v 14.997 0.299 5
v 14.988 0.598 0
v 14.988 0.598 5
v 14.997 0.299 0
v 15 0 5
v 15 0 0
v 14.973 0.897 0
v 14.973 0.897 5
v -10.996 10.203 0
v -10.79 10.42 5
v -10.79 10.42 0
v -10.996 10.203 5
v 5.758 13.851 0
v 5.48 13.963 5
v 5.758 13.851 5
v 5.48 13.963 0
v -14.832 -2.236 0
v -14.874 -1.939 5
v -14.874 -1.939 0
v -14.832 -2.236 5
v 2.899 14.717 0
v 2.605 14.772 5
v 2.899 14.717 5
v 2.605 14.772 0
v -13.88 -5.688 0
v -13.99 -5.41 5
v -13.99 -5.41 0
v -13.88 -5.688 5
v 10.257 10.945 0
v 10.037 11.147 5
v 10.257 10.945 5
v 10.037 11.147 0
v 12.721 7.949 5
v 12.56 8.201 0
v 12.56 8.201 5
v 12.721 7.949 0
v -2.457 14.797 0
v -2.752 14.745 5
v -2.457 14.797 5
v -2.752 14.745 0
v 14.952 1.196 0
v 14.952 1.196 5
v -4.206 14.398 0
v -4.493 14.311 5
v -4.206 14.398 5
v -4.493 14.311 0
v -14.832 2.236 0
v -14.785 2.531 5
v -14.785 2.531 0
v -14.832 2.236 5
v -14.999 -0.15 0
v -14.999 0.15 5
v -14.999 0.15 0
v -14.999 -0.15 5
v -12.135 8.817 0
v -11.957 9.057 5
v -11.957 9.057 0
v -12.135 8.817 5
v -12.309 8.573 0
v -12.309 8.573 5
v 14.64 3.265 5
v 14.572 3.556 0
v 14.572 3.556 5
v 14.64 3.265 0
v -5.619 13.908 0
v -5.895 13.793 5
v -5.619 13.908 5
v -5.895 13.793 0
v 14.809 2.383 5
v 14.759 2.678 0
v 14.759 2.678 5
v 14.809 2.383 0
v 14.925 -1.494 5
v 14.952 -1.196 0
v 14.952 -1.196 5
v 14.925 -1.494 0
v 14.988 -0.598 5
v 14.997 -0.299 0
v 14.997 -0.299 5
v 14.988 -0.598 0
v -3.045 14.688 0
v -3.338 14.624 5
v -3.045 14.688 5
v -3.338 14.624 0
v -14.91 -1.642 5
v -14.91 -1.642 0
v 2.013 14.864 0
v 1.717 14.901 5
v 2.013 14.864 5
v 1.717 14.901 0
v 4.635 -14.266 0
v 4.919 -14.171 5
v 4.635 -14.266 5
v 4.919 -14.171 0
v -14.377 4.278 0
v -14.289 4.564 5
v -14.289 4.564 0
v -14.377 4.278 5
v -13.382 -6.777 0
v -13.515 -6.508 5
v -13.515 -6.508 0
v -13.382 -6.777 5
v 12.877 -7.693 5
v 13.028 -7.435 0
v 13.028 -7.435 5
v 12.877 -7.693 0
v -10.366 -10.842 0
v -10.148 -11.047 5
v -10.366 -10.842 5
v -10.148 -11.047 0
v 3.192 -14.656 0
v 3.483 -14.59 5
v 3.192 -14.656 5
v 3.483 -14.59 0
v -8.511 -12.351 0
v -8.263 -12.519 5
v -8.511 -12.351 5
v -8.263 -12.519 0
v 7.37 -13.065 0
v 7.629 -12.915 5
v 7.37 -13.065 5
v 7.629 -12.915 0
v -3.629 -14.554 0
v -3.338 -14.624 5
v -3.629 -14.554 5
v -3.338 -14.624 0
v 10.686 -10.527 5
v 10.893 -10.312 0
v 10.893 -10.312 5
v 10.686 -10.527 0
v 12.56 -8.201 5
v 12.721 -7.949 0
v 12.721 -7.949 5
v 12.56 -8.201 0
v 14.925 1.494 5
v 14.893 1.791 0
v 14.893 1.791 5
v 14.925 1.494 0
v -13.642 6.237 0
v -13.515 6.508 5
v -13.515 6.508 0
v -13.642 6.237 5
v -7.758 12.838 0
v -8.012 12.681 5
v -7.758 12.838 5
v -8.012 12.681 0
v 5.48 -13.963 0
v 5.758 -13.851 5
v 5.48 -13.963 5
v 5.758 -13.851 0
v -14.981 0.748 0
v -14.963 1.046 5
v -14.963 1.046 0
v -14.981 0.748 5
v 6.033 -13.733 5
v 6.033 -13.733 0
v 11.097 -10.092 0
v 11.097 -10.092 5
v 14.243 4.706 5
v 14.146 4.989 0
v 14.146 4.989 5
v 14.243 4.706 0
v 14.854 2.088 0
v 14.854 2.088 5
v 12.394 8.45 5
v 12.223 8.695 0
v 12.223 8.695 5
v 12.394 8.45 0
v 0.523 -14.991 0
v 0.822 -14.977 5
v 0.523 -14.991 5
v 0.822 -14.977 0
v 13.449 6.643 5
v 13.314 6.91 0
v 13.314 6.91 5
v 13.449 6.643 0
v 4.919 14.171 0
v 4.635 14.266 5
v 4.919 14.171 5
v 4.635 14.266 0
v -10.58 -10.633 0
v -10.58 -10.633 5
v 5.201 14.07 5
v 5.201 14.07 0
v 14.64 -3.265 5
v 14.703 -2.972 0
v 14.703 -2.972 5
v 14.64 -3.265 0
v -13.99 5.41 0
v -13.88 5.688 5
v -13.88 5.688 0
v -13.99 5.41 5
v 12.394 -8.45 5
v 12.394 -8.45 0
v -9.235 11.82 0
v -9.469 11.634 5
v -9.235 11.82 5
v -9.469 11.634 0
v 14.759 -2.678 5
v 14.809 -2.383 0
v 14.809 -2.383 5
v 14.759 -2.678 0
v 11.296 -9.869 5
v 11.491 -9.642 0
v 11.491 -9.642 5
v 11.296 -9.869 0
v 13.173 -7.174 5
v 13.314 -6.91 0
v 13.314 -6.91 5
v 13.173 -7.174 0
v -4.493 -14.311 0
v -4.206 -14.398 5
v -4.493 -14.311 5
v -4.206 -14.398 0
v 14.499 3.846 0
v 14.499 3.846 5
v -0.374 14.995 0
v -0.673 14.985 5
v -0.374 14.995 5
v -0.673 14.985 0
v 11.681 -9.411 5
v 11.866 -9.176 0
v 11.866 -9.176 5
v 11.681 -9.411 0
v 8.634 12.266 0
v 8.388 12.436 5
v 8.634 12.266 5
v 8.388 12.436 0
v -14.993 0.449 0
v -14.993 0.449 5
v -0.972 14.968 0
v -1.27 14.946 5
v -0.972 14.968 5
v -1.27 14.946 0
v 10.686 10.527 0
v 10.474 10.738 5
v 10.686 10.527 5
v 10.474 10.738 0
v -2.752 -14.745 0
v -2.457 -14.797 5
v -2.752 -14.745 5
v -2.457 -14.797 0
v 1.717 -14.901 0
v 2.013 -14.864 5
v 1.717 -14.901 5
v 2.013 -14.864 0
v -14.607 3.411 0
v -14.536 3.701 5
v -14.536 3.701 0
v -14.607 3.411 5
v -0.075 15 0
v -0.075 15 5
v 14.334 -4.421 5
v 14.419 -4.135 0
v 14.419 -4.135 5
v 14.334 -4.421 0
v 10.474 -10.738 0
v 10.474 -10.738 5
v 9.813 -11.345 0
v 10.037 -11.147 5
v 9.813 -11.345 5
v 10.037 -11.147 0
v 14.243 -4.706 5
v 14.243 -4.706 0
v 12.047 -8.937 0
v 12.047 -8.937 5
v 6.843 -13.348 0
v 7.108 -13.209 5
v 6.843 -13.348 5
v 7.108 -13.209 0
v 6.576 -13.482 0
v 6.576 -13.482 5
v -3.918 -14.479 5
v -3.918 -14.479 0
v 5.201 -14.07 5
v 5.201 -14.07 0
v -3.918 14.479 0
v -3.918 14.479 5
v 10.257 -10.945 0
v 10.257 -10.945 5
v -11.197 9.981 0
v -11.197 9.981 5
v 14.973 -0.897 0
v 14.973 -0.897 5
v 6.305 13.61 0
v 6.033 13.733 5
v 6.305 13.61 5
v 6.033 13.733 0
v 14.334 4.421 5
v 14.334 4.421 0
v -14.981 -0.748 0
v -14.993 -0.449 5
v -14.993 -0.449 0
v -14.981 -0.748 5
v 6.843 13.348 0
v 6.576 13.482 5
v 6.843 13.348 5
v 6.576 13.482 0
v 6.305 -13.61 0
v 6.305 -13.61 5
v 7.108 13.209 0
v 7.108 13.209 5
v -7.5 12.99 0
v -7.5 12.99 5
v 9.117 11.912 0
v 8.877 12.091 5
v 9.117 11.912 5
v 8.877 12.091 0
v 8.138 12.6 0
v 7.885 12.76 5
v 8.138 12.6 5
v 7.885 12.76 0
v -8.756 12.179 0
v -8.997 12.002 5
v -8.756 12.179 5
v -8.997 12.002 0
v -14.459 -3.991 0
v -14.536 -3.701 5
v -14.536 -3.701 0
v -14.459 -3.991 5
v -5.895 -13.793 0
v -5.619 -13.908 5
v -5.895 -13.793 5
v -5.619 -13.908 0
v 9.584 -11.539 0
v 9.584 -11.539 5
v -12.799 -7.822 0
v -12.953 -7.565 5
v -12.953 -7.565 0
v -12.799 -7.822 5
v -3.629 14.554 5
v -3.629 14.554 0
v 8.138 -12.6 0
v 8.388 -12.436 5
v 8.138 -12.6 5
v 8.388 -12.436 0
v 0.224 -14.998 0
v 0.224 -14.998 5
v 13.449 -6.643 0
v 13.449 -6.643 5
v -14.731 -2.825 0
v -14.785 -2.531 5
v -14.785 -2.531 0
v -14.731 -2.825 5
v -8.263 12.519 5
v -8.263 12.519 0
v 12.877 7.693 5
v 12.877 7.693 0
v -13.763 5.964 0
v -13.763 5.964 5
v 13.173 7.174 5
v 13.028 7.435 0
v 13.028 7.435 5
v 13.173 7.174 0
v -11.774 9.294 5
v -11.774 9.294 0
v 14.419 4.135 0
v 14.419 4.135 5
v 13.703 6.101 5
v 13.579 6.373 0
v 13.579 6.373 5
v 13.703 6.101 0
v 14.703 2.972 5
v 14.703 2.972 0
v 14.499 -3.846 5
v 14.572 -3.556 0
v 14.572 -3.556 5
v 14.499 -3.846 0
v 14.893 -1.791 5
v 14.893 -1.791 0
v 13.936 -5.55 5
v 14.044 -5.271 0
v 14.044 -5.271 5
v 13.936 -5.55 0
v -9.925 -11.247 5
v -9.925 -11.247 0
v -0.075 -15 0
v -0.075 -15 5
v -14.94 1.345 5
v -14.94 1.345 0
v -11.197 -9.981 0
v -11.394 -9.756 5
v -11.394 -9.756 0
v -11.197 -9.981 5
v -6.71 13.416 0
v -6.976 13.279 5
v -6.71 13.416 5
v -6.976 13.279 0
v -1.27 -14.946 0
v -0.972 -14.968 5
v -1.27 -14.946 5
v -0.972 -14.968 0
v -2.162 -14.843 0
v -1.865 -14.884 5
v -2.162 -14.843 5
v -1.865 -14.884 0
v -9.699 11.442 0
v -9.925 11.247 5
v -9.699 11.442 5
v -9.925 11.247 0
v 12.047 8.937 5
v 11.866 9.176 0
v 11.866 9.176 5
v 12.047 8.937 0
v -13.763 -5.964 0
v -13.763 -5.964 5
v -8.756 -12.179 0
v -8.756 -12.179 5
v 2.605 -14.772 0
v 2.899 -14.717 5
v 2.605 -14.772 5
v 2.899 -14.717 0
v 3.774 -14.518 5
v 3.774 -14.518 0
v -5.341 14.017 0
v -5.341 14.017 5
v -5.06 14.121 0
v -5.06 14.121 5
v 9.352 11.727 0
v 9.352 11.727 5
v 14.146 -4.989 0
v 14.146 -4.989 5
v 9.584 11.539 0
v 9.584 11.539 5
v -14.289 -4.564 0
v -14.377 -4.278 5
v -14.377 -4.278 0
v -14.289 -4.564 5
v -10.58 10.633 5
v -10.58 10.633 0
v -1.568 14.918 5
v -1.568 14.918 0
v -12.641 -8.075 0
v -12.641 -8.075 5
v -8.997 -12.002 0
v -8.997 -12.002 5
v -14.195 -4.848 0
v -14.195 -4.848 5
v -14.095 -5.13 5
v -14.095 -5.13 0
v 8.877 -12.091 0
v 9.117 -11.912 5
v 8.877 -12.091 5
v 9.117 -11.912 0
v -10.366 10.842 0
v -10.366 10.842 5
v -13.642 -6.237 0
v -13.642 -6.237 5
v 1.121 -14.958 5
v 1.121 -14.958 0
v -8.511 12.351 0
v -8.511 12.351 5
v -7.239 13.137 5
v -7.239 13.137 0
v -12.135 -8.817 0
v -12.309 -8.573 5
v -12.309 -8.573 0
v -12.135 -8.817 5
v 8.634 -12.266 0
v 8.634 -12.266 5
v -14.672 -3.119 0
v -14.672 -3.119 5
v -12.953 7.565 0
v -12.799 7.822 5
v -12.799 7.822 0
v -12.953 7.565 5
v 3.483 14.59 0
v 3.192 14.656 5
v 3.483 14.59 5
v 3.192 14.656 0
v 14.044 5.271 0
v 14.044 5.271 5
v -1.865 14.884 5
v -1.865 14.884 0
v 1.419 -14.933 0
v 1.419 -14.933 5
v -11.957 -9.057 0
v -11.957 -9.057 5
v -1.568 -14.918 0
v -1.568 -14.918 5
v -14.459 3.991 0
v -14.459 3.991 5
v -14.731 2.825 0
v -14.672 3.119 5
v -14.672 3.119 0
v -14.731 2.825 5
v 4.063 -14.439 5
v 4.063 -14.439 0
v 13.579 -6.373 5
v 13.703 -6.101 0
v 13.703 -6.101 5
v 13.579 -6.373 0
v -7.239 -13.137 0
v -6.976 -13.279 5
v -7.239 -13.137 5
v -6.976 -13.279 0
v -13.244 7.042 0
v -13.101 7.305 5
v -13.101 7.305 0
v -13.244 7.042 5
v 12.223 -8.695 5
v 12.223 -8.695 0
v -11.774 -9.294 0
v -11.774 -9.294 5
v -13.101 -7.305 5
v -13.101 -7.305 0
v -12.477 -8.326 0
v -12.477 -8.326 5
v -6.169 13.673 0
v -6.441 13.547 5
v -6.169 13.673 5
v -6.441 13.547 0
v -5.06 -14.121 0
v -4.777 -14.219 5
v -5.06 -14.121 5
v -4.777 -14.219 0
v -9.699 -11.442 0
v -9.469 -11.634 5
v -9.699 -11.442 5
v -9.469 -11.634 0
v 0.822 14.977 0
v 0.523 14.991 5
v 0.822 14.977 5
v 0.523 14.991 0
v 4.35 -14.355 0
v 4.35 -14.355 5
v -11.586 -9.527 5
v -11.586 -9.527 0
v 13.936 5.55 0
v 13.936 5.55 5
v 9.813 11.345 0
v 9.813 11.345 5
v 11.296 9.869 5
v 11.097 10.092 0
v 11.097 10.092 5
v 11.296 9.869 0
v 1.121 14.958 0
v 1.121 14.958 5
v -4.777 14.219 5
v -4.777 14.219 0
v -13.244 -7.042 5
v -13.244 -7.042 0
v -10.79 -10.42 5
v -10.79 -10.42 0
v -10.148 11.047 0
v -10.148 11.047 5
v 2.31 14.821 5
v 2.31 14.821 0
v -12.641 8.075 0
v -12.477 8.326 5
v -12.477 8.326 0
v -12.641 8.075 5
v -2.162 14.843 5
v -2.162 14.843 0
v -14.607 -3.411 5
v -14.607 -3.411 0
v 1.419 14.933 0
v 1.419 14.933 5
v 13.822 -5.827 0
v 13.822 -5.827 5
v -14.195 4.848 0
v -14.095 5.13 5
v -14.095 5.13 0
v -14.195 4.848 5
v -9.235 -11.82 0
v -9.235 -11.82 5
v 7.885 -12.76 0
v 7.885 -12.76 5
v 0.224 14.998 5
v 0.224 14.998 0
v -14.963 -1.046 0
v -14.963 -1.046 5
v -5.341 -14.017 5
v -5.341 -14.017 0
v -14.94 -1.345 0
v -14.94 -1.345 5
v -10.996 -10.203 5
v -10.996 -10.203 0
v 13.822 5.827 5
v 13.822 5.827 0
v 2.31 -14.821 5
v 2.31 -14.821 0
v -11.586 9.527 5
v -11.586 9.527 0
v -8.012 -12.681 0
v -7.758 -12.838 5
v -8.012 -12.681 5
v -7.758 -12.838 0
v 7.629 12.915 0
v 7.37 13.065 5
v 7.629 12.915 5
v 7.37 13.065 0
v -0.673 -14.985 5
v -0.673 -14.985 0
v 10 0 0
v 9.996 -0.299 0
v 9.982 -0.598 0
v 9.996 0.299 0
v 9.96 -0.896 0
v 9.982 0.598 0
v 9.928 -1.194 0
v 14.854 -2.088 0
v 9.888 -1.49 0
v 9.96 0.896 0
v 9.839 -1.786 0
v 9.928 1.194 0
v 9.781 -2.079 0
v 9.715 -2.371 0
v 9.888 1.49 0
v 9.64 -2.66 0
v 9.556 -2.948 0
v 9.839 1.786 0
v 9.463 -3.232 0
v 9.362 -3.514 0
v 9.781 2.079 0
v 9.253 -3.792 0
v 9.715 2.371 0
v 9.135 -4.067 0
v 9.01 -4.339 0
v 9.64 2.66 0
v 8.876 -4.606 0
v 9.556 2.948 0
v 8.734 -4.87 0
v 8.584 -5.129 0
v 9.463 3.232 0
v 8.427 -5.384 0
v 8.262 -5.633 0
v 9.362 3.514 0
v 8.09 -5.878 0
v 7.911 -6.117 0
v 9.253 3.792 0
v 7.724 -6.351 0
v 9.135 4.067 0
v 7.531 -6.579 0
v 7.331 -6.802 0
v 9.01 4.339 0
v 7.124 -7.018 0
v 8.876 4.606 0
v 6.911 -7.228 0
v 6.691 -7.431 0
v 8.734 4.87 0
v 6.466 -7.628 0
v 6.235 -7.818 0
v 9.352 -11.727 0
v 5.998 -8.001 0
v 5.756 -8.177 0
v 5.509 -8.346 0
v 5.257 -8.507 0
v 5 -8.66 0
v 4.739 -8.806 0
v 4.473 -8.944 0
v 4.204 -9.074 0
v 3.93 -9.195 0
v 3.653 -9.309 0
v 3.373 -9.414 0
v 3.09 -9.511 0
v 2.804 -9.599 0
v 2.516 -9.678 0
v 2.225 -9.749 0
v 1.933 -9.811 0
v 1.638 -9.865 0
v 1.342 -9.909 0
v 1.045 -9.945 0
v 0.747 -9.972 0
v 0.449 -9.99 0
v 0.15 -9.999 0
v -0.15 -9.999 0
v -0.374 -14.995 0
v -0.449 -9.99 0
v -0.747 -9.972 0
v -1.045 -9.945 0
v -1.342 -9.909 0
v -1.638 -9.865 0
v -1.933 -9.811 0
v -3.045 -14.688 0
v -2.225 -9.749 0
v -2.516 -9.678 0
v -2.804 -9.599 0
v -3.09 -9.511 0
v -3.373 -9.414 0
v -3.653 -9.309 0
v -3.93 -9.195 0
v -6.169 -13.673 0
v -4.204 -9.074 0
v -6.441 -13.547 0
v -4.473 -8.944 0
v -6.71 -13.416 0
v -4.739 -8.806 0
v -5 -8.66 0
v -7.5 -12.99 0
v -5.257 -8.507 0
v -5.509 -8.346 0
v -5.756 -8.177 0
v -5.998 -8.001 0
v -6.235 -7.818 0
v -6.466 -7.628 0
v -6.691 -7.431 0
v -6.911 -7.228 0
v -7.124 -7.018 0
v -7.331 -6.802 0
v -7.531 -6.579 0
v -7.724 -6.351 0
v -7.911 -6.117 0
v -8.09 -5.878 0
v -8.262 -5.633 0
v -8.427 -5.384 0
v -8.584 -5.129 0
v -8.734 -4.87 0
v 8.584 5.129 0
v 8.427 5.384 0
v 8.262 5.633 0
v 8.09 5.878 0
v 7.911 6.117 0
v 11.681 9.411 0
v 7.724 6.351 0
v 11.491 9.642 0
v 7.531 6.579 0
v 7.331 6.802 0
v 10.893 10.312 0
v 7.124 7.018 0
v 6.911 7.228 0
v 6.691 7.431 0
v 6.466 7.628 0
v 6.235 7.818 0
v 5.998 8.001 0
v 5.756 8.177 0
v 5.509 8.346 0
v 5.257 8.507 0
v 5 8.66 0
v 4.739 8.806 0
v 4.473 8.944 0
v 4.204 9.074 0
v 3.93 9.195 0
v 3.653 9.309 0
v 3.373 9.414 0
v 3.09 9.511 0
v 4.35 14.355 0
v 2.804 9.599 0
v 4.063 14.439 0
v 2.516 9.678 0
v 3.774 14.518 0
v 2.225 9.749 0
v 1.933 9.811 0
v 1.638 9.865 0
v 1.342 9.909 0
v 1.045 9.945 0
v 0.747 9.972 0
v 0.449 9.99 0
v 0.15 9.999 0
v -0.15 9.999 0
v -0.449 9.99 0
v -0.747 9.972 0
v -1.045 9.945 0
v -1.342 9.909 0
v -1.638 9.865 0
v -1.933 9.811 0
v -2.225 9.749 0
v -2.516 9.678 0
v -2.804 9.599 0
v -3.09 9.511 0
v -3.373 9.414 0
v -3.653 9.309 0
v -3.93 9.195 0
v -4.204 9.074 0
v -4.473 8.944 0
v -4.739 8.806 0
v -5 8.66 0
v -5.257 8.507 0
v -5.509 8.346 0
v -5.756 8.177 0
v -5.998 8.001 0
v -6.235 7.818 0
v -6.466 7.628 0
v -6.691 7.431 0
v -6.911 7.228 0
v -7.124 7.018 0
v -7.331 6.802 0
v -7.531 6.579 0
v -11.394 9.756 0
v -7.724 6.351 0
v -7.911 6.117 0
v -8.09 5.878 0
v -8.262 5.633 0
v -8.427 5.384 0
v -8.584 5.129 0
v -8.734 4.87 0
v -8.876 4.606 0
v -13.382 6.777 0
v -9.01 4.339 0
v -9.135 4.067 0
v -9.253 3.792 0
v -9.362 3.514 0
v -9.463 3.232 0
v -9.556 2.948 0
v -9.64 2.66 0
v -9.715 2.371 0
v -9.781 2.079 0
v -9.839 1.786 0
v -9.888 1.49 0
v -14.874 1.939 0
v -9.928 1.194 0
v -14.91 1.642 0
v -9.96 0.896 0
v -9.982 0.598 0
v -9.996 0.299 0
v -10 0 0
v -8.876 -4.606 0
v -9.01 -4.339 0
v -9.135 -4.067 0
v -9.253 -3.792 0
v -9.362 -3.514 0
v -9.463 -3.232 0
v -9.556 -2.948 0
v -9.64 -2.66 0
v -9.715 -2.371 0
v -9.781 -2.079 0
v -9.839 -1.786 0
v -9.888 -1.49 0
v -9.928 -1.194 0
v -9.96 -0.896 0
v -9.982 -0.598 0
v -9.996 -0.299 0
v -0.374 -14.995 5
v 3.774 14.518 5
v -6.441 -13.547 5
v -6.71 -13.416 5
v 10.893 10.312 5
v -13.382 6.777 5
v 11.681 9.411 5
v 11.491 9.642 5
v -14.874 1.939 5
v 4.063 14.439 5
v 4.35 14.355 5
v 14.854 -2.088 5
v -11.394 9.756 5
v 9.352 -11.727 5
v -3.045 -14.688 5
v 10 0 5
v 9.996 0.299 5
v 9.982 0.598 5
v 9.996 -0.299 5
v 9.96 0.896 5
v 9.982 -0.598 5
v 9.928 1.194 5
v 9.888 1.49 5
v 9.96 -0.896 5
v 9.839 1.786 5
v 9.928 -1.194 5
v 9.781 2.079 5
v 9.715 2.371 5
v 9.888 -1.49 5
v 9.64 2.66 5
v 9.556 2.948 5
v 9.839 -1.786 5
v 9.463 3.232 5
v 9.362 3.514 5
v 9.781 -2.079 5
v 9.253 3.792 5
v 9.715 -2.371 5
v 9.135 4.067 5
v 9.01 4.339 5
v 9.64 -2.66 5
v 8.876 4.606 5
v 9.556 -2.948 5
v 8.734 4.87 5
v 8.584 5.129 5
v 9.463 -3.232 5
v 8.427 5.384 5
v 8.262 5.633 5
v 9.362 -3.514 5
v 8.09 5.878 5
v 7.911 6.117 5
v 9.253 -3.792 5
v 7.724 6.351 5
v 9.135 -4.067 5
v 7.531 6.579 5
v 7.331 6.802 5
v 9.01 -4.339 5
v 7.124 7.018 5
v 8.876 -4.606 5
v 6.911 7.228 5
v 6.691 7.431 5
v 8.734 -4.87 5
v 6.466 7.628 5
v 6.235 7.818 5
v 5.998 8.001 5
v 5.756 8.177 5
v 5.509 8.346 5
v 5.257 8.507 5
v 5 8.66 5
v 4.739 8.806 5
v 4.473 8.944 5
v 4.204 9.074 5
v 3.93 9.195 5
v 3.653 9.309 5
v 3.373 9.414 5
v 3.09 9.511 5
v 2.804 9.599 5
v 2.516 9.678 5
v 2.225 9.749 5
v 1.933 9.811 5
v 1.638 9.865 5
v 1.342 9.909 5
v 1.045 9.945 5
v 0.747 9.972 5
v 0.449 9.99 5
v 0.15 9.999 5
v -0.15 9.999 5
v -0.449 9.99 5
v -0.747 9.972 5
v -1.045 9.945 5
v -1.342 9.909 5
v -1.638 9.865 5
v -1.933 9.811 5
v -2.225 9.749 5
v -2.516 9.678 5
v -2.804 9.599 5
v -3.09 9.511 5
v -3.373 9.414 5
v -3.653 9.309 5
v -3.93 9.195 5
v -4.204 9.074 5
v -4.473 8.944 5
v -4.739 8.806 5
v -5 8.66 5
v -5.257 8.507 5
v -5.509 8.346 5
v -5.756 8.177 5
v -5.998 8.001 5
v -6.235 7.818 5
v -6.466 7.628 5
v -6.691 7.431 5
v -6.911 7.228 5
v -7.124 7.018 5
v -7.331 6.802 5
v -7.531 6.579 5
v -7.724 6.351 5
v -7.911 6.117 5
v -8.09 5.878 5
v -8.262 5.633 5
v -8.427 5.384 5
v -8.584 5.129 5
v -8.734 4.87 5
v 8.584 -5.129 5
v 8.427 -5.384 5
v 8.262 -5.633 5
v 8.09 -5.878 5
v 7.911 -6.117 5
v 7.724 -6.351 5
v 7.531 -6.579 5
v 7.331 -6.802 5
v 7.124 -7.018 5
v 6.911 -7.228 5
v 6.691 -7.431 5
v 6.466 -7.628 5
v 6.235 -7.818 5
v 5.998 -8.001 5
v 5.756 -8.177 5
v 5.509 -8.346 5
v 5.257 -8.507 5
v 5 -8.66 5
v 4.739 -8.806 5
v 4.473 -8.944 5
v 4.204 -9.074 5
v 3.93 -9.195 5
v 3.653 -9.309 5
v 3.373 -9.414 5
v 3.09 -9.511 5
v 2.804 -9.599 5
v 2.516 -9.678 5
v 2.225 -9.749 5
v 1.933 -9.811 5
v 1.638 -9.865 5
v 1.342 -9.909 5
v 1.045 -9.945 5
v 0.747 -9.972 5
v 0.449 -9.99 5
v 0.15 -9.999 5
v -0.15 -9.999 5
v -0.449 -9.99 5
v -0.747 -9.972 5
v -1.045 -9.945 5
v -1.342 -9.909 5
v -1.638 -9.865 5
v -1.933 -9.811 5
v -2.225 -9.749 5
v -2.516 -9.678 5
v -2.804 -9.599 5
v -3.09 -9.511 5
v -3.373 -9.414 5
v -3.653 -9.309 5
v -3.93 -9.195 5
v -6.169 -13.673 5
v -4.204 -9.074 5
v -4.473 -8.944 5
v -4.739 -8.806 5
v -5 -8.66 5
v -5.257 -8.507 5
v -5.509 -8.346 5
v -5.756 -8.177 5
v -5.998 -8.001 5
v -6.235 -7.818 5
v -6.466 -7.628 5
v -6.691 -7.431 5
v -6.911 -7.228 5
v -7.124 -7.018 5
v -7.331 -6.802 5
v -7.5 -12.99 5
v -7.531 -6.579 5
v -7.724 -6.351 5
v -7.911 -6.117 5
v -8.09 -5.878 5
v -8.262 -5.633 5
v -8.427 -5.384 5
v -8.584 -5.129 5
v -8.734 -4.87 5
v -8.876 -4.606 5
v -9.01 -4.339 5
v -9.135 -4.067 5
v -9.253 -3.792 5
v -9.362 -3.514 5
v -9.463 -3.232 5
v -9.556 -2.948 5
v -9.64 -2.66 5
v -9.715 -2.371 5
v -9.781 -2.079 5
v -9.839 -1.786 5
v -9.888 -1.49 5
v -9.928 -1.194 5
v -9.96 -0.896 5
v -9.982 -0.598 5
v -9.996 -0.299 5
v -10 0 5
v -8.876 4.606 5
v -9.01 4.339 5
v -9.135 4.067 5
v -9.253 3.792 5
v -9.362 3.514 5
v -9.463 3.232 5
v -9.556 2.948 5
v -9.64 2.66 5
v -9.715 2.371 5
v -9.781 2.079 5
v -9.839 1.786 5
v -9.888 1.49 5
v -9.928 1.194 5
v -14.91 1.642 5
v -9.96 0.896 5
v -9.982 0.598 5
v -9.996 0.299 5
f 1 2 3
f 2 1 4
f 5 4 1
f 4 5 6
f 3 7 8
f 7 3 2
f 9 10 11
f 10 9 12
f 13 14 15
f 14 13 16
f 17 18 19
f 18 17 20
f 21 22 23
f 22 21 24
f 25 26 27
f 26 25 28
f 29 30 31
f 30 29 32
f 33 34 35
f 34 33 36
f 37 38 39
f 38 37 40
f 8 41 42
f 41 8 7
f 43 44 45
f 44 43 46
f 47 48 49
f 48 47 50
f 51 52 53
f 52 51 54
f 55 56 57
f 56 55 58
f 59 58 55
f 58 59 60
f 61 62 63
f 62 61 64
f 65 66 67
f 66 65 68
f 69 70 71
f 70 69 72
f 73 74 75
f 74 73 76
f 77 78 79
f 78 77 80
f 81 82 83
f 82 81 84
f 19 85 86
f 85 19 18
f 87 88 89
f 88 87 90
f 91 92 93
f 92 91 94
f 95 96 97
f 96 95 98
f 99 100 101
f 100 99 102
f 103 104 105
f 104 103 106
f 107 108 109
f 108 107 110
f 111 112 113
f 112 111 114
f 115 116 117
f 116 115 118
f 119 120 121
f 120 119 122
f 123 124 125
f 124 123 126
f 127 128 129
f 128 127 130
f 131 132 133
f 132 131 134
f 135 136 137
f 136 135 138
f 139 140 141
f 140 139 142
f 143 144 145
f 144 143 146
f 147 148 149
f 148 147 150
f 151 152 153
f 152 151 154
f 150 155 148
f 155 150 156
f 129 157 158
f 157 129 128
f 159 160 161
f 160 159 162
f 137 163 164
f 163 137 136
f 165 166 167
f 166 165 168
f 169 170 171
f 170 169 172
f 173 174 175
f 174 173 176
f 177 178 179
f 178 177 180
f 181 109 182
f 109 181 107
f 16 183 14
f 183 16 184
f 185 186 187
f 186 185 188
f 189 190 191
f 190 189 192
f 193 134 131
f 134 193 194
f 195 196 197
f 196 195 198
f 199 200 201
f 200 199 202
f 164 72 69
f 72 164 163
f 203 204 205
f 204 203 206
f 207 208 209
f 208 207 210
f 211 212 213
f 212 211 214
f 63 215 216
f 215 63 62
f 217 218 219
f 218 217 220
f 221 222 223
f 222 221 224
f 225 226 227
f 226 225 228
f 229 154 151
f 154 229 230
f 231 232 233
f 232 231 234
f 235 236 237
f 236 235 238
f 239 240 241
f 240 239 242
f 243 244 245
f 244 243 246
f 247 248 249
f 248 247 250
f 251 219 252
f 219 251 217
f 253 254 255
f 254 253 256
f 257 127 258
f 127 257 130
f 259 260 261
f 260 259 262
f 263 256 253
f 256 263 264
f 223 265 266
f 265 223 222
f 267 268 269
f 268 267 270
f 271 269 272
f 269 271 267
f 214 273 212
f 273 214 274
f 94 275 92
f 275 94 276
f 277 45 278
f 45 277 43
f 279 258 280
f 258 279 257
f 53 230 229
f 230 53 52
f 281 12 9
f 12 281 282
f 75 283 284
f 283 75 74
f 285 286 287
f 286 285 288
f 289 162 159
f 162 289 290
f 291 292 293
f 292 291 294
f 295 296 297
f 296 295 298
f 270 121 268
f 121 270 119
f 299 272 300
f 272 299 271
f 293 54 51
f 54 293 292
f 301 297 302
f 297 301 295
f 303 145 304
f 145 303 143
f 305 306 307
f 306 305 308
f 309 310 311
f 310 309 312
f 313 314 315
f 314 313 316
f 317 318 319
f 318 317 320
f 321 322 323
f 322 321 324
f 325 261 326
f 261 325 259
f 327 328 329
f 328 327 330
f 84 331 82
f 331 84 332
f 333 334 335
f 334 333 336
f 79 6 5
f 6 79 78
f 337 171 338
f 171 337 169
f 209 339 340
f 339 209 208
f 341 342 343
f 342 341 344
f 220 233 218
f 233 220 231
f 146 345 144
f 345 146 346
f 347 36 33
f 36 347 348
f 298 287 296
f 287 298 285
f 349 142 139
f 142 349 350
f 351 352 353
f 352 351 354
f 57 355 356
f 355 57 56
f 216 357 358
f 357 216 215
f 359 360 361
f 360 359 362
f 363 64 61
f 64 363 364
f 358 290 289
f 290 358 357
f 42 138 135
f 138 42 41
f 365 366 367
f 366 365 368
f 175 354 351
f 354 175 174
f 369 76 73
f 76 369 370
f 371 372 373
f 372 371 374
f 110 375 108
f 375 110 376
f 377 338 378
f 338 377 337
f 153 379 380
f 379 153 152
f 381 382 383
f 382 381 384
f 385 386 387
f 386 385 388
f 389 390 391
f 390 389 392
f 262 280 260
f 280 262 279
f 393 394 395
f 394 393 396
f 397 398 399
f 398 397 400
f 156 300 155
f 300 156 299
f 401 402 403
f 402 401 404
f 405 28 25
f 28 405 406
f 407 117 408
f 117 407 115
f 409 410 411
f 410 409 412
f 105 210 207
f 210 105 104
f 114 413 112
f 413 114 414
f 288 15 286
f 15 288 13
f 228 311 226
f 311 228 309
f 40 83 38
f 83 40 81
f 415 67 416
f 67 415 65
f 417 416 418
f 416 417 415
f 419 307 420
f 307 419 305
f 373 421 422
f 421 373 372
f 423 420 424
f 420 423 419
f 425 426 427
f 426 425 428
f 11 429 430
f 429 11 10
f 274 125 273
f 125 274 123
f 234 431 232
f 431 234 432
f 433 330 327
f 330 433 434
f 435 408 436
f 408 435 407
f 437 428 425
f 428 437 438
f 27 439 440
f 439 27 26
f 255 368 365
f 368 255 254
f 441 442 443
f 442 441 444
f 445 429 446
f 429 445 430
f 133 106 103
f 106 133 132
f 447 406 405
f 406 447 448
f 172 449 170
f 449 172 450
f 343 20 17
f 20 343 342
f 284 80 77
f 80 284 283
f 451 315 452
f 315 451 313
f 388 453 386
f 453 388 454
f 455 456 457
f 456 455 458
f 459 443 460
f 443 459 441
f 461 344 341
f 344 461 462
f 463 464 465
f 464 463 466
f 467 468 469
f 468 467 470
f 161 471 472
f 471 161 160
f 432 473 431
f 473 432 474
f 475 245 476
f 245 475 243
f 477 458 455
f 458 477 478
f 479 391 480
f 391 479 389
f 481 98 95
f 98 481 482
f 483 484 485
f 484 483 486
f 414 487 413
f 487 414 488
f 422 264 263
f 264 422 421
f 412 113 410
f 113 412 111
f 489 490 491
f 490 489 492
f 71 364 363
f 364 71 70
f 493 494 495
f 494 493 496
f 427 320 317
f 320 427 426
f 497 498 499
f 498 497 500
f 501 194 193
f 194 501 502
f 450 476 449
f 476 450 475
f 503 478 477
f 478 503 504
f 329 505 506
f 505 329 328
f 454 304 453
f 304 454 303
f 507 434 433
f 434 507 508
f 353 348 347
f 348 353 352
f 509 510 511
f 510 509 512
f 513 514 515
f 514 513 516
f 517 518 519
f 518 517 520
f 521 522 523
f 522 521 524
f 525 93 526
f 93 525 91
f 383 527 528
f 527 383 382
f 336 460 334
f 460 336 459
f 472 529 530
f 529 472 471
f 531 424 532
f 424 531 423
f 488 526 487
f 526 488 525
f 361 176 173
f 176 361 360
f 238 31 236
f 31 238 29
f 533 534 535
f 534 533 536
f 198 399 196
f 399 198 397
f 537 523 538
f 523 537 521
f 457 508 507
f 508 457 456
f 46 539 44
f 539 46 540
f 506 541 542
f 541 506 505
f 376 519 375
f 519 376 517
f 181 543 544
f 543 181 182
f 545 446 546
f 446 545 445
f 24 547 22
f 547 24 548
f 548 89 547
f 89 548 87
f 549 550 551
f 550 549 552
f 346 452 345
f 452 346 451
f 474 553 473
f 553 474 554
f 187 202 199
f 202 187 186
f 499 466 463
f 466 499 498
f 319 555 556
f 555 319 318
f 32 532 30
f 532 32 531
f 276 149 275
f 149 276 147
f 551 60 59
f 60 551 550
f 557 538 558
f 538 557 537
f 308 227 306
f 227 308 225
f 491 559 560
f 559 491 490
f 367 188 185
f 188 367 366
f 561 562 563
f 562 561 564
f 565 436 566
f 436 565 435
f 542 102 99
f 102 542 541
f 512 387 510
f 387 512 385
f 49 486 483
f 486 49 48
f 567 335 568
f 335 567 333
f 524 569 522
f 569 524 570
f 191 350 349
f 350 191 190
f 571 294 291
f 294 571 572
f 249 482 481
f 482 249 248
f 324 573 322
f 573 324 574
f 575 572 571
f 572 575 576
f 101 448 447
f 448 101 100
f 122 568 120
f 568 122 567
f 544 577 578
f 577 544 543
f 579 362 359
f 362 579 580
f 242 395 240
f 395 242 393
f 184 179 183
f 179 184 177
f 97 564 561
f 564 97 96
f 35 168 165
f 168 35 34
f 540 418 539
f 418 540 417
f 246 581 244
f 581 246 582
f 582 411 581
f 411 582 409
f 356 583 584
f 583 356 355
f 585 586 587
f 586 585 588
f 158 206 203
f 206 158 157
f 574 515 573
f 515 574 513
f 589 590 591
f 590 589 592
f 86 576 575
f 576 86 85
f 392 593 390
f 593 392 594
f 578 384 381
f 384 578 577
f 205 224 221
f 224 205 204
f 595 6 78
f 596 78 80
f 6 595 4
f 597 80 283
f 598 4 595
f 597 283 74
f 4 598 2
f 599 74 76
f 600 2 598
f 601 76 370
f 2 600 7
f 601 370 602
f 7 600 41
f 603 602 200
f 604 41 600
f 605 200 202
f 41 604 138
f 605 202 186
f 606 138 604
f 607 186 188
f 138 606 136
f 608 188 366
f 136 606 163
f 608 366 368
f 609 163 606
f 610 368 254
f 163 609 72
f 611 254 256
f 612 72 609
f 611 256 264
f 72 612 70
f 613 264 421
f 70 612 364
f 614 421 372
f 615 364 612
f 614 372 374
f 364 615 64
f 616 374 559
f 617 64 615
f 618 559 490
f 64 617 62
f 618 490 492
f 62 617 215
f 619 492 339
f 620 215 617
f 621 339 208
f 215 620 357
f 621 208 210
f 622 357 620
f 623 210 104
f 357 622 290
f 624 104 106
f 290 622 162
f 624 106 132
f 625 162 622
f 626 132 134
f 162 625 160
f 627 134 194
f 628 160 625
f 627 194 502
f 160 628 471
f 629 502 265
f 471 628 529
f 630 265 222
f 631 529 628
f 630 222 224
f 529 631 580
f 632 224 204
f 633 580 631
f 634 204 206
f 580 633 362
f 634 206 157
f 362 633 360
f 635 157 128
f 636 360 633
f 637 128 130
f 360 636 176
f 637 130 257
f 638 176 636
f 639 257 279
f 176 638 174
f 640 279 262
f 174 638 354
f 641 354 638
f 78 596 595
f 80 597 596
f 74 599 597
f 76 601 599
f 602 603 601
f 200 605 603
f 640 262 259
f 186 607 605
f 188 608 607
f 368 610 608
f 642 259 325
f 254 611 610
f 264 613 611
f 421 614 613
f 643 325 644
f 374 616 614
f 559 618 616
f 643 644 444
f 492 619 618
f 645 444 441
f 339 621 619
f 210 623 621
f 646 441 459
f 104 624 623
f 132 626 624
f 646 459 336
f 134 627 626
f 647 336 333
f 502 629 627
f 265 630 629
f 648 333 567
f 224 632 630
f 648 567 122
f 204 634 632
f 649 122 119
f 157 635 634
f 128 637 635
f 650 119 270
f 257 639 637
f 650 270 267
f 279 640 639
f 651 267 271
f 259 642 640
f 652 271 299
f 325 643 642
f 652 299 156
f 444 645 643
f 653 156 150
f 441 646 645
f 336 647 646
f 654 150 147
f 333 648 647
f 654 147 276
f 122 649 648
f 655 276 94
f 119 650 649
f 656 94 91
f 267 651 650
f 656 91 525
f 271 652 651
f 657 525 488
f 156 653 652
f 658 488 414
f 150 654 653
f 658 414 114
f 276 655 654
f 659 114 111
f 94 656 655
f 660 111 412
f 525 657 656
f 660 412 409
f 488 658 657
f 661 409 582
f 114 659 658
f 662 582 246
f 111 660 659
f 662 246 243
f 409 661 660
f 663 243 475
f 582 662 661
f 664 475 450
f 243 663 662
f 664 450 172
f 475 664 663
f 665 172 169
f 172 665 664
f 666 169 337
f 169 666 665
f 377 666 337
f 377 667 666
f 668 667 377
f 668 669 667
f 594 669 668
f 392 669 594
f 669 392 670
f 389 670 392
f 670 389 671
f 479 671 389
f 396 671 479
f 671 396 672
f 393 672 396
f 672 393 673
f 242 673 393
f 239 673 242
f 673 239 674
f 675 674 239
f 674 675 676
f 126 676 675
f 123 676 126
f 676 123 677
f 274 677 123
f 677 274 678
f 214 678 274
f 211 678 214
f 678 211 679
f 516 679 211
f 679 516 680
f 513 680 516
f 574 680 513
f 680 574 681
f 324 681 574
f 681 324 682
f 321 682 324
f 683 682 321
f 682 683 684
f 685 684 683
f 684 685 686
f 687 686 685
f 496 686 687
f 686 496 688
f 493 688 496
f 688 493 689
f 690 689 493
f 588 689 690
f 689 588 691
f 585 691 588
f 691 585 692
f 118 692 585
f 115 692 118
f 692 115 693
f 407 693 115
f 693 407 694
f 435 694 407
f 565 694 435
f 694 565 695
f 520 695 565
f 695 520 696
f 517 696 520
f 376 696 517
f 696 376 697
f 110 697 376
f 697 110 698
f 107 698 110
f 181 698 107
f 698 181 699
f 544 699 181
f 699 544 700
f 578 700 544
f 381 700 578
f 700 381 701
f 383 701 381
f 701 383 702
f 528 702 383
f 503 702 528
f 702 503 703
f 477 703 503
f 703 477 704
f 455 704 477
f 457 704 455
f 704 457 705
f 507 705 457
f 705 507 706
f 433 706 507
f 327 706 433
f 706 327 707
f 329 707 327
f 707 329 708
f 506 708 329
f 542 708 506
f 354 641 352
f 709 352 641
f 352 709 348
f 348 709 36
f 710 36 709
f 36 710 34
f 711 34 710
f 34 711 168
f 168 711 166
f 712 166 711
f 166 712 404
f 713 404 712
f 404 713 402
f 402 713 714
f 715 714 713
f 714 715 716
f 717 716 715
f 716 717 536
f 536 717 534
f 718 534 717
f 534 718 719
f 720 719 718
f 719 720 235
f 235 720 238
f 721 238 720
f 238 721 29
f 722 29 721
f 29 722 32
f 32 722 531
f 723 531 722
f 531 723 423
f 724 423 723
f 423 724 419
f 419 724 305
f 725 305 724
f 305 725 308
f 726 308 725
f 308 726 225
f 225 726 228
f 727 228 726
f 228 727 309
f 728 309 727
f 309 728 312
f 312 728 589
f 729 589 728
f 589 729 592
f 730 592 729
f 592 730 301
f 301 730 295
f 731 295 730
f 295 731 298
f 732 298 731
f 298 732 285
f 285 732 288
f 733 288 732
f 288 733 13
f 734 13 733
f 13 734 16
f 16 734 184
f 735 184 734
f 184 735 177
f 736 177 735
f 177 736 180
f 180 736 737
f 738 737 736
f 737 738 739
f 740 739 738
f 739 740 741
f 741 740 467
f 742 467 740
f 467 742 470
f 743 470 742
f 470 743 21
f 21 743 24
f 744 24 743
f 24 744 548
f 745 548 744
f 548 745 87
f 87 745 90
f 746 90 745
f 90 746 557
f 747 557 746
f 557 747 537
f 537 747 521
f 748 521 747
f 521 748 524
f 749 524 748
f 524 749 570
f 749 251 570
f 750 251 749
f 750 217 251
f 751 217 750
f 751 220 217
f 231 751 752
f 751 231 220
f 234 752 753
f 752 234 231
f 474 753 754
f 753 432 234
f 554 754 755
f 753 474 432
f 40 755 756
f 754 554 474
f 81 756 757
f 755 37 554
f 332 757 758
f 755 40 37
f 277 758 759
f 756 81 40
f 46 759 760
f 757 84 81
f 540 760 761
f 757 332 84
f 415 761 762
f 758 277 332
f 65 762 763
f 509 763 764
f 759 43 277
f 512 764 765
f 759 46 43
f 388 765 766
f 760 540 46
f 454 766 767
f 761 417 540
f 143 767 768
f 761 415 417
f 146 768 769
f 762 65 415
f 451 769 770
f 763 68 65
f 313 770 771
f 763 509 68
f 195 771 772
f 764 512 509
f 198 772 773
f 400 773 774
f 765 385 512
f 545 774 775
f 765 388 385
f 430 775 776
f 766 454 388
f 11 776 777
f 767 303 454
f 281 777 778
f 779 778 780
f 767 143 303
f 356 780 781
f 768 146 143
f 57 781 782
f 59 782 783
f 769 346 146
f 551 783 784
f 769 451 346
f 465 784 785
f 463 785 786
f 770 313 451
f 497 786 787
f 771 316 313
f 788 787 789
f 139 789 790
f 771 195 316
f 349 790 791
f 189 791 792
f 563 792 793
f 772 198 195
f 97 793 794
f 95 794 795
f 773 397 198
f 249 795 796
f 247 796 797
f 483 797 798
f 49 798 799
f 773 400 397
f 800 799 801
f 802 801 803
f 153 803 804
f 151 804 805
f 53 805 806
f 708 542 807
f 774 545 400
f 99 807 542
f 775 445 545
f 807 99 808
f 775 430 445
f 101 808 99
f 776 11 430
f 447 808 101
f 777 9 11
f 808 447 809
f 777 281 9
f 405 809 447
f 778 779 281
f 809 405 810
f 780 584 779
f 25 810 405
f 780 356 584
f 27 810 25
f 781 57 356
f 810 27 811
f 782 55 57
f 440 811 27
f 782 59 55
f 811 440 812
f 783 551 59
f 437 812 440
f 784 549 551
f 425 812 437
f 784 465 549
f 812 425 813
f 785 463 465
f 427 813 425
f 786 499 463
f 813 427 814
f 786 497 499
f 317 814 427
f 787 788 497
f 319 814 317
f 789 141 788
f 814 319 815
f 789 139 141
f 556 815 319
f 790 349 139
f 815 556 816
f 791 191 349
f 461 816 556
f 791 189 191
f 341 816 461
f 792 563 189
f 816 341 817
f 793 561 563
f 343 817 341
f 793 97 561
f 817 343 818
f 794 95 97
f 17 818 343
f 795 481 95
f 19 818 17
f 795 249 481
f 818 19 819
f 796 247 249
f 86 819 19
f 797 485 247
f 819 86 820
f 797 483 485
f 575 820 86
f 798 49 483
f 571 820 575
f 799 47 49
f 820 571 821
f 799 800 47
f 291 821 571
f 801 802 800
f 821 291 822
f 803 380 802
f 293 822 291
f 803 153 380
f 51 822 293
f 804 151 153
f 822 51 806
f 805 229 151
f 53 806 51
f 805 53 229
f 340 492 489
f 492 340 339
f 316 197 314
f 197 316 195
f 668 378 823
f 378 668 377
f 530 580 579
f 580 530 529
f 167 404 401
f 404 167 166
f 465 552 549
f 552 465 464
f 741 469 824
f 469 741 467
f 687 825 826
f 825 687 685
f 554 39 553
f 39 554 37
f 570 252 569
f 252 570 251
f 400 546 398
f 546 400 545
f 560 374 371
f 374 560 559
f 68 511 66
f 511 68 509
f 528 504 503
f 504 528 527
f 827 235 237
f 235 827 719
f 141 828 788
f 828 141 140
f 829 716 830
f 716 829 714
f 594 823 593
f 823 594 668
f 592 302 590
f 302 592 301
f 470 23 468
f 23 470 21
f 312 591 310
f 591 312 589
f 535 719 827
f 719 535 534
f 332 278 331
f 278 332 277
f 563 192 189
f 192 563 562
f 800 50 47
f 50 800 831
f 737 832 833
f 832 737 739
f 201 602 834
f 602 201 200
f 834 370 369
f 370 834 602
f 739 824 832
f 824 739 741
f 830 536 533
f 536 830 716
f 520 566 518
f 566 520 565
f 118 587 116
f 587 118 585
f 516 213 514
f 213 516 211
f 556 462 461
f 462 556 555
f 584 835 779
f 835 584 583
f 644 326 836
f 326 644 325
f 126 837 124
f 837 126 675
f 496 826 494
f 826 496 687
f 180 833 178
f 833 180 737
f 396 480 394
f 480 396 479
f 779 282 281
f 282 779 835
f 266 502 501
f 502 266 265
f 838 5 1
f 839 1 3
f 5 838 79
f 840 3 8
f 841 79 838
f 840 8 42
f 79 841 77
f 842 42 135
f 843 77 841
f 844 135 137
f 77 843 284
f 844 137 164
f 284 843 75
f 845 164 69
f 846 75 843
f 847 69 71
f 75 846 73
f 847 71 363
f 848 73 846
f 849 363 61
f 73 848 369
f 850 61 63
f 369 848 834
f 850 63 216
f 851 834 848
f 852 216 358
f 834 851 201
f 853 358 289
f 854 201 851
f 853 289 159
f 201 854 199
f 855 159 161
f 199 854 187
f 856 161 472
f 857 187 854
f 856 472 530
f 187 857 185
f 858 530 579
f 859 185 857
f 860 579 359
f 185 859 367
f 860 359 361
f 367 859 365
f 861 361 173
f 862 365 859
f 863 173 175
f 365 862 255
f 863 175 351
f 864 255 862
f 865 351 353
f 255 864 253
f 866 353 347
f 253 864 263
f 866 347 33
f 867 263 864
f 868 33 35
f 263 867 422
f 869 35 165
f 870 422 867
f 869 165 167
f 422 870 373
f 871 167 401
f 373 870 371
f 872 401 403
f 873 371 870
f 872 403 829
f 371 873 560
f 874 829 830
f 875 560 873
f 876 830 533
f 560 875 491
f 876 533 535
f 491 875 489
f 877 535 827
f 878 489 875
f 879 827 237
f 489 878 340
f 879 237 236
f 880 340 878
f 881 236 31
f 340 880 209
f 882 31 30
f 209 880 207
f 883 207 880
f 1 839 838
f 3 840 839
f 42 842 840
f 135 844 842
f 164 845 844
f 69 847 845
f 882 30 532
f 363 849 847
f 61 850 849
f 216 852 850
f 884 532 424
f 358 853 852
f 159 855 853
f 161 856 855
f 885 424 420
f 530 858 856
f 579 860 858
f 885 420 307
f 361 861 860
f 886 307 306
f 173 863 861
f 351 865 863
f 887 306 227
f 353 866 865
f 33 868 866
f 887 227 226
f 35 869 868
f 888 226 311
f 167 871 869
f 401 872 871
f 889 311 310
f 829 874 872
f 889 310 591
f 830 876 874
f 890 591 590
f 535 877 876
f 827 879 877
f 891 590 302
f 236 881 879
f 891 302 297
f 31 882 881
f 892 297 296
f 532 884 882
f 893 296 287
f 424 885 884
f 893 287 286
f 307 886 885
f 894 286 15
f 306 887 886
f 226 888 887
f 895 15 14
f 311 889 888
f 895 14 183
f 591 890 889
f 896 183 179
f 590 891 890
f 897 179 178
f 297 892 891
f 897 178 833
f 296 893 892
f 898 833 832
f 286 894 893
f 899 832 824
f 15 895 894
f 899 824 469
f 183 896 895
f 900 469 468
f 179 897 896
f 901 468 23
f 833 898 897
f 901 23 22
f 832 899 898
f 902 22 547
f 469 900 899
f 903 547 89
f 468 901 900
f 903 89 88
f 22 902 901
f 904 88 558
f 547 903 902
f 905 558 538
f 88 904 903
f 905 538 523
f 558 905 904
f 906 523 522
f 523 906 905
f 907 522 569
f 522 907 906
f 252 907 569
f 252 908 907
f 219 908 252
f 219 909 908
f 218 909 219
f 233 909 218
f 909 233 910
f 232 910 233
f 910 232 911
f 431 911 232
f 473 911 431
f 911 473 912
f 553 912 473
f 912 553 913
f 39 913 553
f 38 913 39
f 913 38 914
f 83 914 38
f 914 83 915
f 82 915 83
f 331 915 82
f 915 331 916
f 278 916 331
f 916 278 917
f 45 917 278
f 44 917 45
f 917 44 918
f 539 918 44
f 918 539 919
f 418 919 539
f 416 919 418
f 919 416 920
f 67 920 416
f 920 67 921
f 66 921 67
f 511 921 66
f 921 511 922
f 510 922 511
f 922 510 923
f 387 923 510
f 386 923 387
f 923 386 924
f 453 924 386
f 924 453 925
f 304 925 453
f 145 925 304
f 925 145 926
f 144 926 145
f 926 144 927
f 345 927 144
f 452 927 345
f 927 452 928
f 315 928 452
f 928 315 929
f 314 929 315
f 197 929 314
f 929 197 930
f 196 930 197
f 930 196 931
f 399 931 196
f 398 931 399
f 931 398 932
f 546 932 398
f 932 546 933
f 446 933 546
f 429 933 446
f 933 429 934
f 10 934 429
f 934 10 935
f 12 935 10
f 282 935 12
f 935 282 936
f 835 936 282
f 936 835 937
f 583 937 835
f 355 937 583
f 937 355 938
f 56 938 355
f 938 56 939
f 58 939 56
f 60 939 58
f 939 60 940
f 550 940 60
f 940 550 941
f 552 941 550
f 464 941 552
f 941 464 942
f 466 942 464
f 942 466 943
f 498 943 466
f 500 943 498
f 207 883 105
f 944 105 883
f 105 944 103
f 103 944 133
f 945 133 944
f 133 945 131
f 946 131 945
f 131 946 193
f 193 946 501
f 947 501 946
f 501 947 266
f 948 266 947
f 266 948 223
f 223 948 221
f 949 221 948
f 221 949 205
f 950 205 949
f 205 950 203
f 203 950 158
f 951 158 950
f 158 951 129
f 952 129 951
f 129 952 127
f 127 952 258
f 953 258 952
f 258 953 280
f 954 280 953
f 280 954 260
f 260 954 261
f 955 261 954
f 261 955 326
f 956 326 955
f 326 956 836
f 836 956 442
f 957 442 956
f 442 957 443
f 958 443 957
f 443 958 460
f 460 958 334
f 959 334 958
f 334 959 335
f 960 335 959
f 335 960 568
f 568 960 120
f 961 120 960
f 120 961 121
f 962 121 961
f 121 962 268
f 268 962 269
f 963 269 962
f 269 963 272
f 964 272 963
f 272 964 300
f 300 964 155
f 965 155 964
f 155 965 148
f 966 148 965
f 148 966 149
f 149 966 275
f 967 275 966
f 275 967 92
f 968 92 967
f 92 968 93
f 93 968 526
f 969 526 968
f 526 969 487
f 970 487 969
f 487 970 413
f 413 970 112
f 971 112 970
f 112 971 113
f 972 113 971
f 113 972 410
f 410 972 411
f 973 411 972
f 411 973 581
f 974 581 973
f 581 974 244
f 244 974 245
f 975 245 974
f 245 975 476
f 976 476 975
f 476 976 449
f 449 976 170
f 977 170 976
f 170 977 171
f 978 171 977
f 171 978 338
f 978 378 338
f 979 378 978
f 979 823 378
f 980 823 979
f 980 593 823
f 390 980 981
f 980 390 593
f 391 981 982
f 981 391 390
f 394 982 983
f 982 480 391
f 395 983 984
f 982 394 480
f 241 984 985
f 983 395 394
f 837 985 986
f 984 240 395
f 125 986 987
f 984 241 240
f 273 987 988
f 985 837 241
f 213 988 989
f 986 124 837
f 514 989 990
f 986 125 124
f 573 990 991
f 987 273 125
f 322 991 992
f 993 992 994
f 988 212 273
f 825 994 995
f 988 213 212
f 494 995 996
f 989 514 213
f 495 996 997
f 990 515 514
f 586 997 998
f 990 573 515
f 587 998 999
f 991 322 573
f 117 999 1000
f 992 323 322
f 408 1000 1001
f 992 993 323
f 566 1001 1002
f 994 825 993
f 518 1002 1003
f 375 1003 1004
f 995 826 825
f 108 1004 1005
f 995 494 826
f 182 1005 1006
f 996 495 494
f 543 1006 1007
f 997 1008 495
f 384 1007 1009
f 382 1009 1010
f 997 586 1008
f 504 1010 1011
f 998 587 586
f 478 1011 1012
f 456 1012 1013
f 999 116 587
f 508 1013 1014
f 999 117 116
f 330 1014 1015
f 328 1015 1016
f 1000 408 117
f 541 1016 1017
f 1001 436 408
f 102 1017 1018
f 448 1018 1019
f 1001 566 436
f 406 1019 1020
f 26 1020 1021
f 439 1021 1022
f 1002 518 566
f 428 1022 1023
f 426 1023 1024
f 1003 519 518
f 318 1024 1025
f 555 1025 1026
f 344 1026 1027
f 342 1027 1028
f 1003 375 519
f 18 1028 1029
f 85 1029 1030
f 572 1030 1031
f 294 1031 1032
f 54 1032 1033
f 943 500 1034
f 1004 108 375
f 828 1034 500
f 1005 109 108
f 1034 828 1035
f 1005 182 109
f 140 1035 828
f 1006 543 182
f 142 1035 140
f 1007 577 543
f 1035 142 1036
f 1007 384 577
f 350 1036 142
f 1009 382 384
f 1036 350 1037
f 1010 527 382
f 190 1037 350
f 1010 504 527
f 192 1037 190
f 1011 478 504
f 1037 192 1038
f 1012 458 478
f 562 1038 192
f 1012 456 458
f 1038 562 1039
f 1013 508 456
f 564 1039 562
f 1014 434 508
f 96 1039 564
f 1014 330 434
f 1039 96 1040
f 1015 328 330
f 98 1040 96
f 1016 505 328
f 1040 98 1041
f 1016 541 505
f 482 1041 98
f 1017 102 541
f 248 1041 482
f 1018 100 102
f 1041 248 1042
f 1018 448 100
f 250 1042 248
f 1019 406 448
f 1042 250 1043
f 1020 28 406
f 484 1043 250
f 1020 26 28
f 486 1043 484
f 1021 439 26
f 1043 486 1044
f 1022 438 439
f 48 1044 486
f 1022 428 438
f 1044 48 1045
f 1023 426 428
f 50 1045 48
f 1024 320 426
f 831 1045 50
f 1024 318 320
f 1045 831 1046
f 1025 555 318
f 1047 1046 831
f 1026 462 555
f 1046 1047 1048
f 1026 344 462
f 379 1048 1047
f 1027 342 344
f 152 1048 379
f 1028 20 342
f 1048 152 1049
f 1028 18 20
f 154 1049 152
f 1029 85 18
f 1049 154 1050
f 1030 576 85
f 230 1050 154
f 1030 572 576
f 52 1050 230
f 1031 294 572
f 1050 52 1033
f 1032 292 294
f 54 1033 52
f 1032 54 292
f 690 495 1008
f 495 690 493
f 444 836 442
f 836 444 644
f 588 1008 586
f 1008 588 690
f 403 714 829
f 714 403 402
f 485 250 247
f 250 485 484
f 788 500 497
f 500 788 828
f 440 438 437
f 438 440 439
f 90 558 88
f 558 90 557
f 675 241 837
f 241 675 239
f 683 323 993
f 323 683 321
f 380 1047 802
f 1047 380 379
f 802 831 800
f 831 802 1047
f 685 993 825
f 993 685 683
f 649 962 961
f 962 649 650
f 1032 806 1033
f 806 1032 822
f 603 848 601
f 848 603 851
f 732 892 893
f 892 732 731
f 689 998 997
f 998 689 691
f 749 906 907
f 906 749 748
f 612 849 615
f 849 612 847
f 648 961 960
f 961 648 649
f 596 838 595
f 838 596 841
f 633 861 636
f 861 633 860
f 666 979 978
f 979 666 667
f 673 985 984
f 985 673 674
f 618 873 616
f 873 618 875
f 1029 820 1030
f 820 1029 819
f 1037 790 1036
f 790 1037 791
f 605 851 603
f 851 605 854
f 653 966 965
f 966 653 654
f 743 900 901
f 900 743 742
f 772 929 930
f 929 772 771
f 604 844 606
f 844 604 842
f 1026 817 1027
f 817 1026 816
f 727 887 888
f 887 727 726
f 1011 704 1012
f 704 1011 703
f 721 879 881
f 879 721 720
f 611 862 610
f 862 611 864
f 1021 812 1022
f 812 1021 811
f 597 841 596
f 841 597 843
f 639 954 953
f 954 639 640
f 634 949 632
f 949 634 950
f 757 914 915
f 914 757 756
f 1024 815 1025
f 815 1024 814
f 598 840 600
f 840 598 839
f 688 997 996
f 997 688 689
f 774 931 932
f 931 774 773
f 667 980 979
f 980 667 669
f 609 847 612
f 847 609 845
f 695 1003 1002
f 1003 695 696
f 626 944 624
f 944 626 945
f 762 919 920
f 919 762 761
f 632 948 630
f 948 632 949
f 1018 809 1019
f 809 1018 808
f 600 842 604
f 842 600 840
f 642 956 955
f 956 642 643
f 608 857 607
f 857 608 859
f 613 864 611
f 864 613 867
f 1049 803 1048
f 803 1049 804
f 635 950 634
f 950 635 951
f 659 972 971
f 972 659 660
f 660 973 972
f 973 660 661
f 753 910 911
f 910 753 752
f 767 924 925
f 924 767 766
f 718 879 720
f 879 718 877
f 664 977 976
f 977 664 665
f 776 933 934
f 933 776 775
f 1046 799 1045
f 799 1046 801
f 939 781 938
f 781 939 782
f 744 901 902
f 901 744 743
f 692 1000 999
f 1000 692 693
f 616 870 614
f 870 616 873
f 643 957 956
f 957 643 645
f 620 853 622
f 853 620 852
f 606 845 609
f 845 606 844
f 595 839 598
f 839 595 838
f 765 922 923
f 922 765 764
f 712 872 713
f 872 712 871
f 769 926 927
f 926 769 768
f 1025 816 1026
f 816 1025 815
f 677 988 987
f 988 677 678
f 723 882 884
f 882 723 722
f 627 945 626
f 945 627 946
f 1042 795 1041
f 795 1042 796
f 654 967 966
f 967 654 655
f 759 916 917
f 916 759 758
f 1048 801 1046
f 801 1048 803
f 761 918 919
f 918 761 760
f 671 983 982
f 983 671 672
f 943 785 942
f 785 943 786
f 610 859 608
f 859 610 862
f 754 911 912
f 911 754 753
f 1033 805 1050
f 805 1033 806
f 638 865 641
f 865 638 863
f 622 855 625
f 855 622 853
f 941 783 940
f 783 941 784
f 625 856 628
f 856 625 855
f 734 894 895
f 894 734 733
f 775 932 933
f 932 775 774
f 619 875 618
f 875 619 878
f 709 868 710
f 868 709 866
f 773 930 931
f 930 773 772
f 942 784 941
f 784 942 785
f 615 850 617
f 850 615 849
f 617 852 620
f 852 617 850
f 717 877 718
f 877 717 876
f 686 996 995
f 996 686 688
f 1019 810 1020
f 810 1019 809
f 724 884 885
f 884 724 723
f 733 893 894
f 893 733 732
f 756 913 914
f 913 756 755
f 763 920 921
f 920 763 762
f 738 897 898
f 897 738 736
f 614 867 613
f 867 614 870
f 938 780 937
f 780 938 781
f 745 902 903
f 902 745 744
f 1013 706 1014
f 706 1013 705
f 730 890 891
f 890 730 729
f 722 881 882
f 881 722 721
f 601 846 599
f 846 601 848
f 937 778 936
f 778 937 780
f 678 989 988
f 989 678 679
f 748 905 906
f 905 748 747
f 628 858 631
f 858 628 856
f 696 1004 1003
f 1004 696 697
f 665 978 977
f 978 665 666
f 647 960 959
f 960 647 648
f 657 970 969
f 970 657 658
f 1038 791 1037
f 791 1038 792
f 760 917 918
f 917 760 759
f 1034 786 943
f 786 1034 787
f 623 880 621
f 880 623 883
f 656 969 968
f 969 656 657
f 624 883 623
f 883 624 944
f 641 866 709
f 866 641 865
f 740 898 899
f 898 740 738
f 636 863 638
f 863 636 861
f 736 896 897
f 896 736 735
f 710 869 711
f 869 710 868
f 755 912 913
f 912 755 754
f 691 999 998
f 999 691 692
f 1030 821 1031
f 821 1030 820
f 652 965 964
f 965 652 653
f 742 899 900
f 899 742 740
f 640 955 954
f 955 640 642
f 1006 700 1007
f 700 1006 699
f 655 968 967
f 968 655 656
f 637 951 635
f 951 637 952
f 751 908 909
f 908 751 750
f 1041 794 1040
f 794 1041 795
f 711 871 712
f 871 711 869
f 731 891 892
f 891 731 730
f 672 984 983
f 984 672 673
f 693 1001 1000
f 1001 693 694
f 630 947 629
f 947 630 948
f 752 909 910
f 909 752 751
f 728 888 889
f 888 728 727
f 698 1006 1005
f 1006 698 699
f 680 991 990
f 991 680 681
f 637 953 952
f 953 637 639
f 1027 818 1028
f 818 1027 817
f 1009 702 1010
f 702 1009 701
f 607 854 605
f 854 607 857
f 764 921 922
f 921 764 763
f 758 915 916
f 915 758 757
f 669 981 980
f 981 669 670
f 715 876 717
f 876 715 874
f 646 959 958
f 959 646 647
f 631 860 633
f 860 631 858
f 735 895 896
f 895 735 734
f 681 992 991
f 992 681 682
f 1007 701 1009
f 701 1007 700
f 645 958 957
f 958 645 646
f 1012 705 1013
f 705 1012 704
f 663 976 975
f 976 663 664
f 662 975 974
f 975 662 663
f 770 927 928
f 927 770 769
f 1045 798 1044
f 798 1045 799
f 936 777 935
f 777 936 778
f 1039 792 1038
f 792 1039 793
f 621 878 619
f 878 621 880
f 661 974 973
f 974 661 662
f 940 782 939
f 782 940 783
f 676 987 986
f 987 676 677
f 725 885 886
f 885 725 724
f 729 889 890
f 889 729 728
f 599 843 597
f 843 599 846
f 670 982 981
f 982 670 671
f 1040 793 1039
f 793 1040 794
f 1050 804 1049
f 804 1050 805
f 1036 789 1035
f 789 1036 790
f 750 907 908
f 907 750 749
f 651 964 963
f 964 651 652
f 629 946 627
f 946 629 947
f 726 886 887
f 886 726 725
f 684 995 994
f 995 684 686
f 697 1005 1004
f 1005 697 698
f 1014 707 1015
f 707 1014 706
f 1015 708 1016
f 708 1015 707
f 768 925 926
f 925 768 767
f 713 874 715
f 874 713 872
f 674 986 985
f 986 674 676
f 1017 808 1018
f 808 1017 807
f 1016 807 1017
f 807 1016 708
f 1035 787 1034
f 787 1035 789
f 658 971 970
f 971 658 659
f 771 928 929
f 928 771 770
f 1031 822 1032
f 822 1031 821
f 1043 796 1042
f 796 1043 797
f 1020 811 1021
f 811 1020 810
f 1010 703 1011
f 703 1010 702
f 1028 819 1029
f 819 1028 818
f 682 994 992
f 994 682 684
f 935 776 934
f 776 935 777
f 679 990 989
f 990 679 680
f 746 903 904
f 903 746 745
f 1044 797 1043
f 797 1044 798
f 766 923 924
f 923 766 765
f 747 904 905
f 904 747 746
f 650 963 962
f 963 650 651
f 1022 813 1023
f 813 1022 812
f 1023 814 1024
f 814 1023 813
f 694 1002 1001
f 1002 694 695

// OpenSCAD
$fs = 0.3;
$fa = 1;

difference() {
	cylinder(r=15, h=5);
	translate([0, 0, -1]) {
		cylinder(r=10, h=7);
	}
}
